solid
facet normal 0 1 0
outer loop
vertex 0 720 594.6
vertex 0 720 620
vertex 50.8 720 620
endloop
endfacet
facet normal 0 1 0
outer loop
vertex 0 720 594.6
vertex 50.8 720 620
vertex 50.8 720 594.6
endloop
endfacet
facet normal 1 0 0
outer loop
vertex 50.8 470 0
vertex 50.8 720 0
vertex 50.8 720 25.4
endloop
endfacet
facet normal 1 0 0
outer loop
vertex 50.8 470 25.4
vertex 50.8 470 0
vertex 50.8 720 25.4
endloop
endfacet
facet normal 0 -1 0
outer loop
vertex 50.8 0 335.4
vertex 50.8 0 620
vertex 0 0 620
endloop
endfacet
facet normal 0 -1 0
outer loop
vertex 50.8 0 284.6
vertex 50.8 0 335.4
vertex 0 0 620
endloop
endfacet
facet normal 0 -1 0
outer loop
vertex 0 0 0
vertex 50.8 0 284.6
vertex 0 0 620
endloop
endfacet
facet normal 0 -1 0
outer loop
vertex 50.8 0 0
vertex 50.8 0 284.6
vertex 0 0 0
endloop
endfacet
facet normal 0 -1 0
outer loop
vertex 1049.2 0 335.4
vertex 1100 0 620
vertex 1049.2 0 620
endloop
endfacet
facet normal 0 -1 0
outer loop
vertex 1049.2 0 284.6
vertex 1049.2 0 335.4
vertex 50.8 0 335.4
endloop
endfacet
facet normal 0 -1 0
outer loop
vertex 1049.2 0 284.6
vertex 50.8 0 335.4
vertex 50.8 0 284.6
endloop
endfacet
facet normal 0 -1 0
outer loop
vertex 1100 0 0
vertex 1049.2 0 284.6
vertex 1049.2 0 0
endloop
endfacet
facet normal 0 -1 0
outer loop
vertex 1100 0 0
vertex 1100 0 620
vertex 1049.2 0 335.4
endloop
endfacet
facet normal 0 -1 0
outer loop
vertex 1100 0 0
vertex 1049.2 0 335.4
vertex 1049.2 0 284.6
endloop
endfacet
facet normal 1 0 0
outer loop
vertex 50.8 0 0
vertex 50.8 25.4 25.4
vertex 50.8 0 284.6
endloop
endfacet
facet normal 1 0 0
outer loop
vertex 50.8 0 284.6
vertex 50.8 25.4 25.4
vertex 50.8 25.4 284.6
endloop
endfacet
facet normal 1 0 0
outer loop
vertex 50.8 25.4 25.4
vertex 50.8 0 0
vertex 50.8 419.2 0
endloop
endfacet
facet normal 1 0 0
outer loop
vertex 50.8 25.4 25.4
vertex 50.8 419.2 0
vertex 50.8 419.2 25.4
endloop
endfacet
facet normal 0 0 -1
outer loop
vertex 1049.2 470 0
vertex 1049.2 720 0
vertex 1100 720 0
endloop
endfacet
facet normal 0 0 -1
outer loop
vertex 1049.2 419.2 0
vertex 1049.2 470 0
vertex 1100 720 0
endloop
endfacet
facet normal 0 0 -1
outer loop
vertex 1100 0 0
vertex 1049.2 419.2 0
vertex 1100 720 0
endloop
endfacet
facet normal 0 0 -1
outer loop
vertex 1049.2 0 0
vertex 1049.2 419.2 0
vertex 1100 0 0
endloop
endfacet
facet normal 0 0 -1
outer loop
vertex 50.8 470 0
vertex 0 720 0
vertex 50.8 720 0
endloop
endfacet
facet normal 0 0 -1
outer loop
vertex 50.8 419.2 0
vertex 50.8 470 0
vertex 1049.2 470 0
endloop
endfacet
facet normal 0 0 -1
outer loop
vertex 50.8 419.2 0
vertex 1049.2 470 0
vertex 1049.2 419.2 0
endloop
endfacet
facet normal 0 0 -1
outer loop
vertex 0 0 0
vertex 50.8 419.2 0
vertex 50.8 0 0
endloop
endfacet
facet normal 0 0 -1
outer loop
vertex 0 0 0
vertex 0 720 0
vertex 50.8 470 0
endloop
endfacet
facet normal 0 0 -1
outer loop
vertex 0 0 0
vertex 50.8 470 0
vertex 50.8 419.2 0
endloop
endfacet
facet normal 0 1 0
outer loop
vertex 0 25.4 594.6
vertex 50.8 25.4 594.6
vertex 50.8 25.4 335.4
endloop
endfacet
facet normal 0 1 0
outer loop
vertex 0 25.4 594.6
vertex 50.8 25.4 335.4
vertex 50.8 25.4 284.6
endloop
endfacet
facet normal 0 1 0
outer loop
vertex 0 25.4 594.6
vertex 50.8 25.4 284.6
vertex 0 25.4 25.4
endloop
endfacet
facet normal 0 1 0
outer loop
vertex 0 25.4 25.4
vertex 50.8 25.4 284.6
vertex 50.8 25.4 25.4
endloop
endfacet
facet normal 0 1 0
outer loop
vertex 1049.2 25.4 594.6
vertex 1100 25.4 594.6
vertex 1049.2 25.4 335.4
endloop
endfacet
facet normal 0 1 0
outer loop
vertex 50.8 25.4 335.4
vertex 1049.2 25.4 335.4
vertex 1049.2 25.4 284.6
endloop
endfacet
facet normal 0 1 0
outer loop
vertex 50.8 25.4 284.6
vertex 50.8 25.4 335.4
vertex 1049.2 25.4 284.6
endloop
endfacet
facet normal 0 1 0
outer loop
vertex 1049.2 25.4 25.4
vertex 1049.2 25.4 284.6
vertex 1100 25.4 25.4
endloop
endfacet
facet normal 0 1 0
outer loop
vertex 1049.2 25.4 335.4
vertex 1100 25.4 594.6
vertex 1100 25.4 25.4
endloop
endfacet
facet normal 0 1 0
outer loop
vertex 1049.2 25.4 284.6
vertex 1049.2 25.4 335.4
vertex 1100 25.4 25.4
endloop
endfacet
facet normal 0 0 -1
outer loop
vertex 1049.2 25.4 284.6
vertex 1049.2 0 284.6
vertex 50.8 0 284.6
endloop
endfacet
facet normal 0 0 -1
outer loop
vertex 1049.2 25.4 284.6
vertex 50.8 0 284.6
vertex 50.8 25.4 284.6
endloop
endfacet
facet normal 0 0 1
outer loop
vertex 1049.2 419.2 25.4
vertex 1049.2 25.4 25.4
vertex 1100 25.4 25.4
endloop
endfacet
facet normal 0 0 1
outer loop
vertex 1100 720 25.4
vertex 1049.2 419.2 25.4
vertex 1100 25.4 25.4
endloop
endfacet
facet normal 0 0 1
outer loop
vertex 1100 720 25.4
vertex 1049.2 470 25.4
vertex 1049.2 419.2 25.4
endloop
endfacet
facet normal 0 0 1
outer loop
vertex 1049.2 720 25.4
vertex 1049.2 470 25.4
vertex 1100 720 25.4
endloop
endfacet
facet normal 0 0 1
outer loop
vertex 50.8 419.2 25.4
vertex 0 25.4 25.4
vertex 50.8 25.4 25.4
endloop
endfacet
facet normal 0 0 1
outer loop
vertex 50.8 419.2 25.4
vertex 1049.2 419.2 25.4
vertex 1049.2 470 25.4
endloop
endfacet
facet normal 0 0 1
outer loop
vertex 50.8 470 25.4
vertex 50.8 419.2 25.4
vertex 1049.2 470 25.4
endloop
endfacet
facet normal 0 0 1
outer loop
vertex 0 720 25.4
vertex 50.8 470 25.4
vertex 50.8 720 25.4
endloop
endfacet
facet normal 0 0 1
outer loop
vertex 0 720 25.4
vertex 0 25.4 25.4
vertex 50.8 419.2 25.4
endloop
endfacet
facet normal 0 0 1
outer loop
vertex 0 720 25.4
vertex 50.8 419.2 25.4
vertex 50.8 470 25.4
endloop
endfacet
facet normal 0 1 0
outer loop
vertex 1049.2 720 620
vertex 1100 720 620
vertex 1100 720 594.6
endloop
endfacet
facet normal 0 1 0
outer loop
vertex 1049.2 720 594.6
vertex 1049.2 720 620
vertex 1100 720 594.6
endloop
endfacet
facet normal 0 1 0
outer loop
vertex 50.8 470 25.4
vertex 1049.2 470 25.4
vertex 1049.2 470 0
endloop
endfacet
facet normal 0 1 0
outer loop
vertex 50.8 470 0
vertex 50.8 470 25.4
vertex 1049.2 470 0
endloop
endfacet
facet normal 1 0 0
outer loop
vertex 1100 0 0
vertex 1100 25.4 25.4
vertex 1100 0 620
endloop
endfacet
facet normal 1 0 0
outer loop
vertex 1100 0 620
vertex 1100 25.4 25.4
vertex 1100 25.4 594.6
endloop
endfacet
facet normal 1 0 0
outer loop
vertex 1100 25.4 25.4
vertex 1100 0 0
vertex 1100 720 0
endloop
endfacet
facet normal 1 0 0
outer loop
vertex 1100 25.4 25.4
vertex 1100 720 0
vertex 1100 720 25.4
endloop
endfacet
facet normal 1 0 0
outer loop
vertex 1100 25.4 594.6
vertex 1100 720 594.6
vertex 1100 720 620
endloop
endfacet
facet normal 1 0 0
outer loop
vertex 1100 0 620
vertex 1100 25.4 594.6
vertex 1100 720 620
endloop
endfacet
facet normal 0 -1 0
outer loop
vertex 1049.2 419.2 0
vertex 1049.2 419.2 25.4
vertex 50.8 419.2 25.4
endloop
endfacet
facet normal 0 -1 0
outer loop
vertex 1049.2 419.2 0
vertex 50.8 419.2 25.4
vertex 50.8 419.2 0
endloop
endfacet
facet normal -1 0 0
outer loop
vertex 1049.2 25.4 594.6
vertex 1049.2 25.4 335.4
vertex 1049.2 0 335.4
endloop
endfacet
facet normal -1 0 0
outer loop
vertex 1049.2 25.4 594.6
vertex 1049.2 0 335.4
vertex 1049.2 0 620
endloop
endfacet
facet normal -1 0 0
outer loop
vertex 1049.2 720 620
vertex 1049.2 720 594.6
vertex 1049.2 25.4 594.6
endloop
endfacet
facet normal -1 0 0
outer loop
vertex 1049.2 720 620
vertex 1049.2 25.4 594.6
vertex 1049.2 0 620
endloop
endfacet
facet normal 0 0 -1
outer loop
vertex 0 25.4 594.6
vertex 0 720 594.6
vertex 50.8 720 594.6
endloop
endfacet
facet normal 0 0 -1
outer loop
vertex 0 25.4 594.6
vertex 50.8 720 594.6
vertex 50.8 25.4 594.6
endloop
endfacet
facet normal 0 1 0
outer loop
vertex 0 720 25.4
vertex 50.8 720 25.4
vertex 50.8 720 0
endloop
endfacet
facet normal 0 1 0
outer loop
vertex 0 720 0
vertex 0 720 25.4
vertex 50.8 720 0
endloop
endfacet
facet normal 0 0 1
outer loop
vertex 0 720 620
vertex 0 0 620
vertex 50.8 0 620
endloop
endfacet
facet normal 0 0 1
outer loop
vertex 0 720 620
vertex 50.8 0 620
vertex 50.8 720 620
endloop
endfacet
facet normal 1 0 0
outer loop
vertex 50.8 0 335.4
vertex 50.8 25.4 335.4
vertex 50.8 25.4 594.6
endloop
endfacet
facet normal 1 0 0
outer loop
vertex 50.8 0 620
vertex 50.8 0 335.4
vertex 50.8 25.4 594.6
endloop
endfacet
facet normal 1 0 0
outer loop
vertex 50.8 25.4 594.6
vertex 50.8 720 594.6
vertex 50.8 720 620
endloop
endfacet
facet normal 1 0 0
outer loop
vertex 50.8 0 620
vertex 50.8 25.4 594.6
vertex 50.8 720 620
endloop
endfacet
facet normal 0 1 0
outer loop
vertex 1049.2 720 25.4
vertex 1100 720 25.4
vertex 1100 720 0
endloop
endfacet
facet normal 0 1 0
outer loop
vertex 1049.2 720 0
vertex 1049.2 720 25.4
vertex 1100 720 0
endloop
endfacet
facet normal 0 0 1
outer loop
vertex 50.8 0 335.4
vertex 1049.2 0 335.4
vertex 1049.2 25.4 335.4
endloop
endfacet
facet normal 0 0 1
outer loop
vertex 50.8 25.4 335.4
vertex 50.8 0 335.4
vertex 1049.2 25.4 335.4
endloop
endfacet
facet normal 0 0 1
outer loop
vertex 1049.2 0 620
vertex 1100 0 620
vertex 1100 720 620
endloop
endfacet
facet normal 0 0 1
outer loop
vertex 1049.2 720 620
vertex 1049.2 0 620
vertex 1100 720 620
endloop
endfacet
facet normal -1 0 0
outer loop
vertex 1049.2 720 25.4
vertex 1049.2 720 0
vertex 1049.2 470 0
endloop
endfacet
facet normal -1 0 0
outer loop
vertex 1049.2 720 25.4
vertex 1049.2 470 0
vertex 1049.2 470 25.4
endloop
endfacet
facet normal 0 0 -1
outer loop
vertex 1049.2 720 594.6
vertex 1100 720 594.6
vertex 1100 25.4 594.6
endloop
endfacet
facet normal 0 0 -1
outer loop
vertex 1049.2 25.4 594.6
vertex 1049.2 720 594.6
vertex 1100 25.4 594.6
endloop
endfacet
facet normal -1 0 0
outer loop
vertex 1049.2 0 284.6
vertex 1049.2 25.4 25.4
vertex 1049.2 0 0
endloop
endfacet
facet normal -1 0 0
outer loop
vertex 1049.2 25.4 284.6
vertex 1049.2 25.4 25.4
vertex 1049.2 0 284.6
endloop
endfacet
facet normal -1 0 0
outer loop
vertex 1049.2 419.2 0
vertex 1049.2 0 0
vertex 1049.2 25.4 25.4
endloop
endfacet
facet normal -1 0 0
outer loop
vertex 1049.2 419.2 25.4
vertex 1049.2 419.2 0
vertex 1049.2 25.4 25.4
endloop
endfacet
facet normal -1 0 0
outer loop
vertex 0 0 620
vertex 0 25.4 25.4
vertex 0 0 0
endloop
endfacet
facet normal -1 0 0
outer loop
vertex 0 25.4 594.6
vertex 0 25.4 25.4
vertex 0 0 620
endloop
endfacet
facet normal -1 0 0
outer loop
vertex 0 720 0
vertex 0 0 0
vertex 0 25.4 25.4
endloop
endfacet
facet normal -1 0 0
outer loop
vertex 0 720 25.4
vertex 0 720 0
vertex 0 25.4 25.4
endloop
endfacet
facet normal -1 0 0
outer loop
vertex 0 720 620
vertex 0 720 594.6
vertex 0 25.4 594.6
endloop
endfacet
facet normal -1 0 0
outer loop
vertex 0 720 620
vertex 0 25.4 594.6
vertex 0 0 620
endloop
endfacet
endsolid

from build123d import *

# Parameters (mm, degrees)
BOSS_EXTRUDE1_DEPTH = 50.8
SKETCH2_W           = 50.8
SKETCH2_H           = 25.4
BOSS_EXTRUDE2_DEPTH = 499.2
SKETCH3_W           = 25.4
SKETCH3_H           = 50.8
BOSS_EXTRUDE3_DEPTH = 998.4


with BuildPart() as part:
    # Sketch1 → Boss-Extrude1 (new body)
    with BuildSketch(Plane(origin=(0, 0, 0), x_dir=(0, 0, -1), z_dir=(1, 0, 0))):
        Polygon((0, 720), (0, 0), (-620, 0), (-620, 720), (-594.6, 720), (-594.6, 25.4), (-25.4, 25.4), (-25.4, 720), align=None)
    boss_extrude1 = extrude(amount=BOSS_EXTRUDE1_DEPTH)

    # Sketch2 → Boss-Extrude2 (add)
    with BuildSketch(Plane(origin=(50.8, 0, 0), x_dir=(0, 0, -1), z_dir=(1, 0, 0))):
        with Locations((-310, 12.7)):
            Rectangle(SKETCH2_W, SKETCH2_H)
    boss_extrude2 = extrude(amount=BOSS_EXTRUDE2_DEPTH)

    # Mirror1: Boss-Extrude1, Boss-Extrude2 across plane
    add(boss_extrude1.mirror(Plane(origin=(550, 0, 0), x_dir=(0, 0, 1), z_dir=(1, 0, 0))))
    add(boss_extrude2.mirror(Plane(origin=(550, 0, 0), x_dir=(0, 0, 1), z_dir=(1, 0, 0))))

    # Sketch3 → Boss-Extrude3 (add)
    with BuildSketch(Plane(origin=(50.8, 0, 0), x_dir=(0, 0, -1), z_dir=(1, 0, 0))):
        with Locations((-12.7, 444.6)):
            Rectangle(SKETCH3_W, SKETCH3_H)
    extrude(amount=BOSS_EXTRUDE3_DEPTH)


solid = part.part
